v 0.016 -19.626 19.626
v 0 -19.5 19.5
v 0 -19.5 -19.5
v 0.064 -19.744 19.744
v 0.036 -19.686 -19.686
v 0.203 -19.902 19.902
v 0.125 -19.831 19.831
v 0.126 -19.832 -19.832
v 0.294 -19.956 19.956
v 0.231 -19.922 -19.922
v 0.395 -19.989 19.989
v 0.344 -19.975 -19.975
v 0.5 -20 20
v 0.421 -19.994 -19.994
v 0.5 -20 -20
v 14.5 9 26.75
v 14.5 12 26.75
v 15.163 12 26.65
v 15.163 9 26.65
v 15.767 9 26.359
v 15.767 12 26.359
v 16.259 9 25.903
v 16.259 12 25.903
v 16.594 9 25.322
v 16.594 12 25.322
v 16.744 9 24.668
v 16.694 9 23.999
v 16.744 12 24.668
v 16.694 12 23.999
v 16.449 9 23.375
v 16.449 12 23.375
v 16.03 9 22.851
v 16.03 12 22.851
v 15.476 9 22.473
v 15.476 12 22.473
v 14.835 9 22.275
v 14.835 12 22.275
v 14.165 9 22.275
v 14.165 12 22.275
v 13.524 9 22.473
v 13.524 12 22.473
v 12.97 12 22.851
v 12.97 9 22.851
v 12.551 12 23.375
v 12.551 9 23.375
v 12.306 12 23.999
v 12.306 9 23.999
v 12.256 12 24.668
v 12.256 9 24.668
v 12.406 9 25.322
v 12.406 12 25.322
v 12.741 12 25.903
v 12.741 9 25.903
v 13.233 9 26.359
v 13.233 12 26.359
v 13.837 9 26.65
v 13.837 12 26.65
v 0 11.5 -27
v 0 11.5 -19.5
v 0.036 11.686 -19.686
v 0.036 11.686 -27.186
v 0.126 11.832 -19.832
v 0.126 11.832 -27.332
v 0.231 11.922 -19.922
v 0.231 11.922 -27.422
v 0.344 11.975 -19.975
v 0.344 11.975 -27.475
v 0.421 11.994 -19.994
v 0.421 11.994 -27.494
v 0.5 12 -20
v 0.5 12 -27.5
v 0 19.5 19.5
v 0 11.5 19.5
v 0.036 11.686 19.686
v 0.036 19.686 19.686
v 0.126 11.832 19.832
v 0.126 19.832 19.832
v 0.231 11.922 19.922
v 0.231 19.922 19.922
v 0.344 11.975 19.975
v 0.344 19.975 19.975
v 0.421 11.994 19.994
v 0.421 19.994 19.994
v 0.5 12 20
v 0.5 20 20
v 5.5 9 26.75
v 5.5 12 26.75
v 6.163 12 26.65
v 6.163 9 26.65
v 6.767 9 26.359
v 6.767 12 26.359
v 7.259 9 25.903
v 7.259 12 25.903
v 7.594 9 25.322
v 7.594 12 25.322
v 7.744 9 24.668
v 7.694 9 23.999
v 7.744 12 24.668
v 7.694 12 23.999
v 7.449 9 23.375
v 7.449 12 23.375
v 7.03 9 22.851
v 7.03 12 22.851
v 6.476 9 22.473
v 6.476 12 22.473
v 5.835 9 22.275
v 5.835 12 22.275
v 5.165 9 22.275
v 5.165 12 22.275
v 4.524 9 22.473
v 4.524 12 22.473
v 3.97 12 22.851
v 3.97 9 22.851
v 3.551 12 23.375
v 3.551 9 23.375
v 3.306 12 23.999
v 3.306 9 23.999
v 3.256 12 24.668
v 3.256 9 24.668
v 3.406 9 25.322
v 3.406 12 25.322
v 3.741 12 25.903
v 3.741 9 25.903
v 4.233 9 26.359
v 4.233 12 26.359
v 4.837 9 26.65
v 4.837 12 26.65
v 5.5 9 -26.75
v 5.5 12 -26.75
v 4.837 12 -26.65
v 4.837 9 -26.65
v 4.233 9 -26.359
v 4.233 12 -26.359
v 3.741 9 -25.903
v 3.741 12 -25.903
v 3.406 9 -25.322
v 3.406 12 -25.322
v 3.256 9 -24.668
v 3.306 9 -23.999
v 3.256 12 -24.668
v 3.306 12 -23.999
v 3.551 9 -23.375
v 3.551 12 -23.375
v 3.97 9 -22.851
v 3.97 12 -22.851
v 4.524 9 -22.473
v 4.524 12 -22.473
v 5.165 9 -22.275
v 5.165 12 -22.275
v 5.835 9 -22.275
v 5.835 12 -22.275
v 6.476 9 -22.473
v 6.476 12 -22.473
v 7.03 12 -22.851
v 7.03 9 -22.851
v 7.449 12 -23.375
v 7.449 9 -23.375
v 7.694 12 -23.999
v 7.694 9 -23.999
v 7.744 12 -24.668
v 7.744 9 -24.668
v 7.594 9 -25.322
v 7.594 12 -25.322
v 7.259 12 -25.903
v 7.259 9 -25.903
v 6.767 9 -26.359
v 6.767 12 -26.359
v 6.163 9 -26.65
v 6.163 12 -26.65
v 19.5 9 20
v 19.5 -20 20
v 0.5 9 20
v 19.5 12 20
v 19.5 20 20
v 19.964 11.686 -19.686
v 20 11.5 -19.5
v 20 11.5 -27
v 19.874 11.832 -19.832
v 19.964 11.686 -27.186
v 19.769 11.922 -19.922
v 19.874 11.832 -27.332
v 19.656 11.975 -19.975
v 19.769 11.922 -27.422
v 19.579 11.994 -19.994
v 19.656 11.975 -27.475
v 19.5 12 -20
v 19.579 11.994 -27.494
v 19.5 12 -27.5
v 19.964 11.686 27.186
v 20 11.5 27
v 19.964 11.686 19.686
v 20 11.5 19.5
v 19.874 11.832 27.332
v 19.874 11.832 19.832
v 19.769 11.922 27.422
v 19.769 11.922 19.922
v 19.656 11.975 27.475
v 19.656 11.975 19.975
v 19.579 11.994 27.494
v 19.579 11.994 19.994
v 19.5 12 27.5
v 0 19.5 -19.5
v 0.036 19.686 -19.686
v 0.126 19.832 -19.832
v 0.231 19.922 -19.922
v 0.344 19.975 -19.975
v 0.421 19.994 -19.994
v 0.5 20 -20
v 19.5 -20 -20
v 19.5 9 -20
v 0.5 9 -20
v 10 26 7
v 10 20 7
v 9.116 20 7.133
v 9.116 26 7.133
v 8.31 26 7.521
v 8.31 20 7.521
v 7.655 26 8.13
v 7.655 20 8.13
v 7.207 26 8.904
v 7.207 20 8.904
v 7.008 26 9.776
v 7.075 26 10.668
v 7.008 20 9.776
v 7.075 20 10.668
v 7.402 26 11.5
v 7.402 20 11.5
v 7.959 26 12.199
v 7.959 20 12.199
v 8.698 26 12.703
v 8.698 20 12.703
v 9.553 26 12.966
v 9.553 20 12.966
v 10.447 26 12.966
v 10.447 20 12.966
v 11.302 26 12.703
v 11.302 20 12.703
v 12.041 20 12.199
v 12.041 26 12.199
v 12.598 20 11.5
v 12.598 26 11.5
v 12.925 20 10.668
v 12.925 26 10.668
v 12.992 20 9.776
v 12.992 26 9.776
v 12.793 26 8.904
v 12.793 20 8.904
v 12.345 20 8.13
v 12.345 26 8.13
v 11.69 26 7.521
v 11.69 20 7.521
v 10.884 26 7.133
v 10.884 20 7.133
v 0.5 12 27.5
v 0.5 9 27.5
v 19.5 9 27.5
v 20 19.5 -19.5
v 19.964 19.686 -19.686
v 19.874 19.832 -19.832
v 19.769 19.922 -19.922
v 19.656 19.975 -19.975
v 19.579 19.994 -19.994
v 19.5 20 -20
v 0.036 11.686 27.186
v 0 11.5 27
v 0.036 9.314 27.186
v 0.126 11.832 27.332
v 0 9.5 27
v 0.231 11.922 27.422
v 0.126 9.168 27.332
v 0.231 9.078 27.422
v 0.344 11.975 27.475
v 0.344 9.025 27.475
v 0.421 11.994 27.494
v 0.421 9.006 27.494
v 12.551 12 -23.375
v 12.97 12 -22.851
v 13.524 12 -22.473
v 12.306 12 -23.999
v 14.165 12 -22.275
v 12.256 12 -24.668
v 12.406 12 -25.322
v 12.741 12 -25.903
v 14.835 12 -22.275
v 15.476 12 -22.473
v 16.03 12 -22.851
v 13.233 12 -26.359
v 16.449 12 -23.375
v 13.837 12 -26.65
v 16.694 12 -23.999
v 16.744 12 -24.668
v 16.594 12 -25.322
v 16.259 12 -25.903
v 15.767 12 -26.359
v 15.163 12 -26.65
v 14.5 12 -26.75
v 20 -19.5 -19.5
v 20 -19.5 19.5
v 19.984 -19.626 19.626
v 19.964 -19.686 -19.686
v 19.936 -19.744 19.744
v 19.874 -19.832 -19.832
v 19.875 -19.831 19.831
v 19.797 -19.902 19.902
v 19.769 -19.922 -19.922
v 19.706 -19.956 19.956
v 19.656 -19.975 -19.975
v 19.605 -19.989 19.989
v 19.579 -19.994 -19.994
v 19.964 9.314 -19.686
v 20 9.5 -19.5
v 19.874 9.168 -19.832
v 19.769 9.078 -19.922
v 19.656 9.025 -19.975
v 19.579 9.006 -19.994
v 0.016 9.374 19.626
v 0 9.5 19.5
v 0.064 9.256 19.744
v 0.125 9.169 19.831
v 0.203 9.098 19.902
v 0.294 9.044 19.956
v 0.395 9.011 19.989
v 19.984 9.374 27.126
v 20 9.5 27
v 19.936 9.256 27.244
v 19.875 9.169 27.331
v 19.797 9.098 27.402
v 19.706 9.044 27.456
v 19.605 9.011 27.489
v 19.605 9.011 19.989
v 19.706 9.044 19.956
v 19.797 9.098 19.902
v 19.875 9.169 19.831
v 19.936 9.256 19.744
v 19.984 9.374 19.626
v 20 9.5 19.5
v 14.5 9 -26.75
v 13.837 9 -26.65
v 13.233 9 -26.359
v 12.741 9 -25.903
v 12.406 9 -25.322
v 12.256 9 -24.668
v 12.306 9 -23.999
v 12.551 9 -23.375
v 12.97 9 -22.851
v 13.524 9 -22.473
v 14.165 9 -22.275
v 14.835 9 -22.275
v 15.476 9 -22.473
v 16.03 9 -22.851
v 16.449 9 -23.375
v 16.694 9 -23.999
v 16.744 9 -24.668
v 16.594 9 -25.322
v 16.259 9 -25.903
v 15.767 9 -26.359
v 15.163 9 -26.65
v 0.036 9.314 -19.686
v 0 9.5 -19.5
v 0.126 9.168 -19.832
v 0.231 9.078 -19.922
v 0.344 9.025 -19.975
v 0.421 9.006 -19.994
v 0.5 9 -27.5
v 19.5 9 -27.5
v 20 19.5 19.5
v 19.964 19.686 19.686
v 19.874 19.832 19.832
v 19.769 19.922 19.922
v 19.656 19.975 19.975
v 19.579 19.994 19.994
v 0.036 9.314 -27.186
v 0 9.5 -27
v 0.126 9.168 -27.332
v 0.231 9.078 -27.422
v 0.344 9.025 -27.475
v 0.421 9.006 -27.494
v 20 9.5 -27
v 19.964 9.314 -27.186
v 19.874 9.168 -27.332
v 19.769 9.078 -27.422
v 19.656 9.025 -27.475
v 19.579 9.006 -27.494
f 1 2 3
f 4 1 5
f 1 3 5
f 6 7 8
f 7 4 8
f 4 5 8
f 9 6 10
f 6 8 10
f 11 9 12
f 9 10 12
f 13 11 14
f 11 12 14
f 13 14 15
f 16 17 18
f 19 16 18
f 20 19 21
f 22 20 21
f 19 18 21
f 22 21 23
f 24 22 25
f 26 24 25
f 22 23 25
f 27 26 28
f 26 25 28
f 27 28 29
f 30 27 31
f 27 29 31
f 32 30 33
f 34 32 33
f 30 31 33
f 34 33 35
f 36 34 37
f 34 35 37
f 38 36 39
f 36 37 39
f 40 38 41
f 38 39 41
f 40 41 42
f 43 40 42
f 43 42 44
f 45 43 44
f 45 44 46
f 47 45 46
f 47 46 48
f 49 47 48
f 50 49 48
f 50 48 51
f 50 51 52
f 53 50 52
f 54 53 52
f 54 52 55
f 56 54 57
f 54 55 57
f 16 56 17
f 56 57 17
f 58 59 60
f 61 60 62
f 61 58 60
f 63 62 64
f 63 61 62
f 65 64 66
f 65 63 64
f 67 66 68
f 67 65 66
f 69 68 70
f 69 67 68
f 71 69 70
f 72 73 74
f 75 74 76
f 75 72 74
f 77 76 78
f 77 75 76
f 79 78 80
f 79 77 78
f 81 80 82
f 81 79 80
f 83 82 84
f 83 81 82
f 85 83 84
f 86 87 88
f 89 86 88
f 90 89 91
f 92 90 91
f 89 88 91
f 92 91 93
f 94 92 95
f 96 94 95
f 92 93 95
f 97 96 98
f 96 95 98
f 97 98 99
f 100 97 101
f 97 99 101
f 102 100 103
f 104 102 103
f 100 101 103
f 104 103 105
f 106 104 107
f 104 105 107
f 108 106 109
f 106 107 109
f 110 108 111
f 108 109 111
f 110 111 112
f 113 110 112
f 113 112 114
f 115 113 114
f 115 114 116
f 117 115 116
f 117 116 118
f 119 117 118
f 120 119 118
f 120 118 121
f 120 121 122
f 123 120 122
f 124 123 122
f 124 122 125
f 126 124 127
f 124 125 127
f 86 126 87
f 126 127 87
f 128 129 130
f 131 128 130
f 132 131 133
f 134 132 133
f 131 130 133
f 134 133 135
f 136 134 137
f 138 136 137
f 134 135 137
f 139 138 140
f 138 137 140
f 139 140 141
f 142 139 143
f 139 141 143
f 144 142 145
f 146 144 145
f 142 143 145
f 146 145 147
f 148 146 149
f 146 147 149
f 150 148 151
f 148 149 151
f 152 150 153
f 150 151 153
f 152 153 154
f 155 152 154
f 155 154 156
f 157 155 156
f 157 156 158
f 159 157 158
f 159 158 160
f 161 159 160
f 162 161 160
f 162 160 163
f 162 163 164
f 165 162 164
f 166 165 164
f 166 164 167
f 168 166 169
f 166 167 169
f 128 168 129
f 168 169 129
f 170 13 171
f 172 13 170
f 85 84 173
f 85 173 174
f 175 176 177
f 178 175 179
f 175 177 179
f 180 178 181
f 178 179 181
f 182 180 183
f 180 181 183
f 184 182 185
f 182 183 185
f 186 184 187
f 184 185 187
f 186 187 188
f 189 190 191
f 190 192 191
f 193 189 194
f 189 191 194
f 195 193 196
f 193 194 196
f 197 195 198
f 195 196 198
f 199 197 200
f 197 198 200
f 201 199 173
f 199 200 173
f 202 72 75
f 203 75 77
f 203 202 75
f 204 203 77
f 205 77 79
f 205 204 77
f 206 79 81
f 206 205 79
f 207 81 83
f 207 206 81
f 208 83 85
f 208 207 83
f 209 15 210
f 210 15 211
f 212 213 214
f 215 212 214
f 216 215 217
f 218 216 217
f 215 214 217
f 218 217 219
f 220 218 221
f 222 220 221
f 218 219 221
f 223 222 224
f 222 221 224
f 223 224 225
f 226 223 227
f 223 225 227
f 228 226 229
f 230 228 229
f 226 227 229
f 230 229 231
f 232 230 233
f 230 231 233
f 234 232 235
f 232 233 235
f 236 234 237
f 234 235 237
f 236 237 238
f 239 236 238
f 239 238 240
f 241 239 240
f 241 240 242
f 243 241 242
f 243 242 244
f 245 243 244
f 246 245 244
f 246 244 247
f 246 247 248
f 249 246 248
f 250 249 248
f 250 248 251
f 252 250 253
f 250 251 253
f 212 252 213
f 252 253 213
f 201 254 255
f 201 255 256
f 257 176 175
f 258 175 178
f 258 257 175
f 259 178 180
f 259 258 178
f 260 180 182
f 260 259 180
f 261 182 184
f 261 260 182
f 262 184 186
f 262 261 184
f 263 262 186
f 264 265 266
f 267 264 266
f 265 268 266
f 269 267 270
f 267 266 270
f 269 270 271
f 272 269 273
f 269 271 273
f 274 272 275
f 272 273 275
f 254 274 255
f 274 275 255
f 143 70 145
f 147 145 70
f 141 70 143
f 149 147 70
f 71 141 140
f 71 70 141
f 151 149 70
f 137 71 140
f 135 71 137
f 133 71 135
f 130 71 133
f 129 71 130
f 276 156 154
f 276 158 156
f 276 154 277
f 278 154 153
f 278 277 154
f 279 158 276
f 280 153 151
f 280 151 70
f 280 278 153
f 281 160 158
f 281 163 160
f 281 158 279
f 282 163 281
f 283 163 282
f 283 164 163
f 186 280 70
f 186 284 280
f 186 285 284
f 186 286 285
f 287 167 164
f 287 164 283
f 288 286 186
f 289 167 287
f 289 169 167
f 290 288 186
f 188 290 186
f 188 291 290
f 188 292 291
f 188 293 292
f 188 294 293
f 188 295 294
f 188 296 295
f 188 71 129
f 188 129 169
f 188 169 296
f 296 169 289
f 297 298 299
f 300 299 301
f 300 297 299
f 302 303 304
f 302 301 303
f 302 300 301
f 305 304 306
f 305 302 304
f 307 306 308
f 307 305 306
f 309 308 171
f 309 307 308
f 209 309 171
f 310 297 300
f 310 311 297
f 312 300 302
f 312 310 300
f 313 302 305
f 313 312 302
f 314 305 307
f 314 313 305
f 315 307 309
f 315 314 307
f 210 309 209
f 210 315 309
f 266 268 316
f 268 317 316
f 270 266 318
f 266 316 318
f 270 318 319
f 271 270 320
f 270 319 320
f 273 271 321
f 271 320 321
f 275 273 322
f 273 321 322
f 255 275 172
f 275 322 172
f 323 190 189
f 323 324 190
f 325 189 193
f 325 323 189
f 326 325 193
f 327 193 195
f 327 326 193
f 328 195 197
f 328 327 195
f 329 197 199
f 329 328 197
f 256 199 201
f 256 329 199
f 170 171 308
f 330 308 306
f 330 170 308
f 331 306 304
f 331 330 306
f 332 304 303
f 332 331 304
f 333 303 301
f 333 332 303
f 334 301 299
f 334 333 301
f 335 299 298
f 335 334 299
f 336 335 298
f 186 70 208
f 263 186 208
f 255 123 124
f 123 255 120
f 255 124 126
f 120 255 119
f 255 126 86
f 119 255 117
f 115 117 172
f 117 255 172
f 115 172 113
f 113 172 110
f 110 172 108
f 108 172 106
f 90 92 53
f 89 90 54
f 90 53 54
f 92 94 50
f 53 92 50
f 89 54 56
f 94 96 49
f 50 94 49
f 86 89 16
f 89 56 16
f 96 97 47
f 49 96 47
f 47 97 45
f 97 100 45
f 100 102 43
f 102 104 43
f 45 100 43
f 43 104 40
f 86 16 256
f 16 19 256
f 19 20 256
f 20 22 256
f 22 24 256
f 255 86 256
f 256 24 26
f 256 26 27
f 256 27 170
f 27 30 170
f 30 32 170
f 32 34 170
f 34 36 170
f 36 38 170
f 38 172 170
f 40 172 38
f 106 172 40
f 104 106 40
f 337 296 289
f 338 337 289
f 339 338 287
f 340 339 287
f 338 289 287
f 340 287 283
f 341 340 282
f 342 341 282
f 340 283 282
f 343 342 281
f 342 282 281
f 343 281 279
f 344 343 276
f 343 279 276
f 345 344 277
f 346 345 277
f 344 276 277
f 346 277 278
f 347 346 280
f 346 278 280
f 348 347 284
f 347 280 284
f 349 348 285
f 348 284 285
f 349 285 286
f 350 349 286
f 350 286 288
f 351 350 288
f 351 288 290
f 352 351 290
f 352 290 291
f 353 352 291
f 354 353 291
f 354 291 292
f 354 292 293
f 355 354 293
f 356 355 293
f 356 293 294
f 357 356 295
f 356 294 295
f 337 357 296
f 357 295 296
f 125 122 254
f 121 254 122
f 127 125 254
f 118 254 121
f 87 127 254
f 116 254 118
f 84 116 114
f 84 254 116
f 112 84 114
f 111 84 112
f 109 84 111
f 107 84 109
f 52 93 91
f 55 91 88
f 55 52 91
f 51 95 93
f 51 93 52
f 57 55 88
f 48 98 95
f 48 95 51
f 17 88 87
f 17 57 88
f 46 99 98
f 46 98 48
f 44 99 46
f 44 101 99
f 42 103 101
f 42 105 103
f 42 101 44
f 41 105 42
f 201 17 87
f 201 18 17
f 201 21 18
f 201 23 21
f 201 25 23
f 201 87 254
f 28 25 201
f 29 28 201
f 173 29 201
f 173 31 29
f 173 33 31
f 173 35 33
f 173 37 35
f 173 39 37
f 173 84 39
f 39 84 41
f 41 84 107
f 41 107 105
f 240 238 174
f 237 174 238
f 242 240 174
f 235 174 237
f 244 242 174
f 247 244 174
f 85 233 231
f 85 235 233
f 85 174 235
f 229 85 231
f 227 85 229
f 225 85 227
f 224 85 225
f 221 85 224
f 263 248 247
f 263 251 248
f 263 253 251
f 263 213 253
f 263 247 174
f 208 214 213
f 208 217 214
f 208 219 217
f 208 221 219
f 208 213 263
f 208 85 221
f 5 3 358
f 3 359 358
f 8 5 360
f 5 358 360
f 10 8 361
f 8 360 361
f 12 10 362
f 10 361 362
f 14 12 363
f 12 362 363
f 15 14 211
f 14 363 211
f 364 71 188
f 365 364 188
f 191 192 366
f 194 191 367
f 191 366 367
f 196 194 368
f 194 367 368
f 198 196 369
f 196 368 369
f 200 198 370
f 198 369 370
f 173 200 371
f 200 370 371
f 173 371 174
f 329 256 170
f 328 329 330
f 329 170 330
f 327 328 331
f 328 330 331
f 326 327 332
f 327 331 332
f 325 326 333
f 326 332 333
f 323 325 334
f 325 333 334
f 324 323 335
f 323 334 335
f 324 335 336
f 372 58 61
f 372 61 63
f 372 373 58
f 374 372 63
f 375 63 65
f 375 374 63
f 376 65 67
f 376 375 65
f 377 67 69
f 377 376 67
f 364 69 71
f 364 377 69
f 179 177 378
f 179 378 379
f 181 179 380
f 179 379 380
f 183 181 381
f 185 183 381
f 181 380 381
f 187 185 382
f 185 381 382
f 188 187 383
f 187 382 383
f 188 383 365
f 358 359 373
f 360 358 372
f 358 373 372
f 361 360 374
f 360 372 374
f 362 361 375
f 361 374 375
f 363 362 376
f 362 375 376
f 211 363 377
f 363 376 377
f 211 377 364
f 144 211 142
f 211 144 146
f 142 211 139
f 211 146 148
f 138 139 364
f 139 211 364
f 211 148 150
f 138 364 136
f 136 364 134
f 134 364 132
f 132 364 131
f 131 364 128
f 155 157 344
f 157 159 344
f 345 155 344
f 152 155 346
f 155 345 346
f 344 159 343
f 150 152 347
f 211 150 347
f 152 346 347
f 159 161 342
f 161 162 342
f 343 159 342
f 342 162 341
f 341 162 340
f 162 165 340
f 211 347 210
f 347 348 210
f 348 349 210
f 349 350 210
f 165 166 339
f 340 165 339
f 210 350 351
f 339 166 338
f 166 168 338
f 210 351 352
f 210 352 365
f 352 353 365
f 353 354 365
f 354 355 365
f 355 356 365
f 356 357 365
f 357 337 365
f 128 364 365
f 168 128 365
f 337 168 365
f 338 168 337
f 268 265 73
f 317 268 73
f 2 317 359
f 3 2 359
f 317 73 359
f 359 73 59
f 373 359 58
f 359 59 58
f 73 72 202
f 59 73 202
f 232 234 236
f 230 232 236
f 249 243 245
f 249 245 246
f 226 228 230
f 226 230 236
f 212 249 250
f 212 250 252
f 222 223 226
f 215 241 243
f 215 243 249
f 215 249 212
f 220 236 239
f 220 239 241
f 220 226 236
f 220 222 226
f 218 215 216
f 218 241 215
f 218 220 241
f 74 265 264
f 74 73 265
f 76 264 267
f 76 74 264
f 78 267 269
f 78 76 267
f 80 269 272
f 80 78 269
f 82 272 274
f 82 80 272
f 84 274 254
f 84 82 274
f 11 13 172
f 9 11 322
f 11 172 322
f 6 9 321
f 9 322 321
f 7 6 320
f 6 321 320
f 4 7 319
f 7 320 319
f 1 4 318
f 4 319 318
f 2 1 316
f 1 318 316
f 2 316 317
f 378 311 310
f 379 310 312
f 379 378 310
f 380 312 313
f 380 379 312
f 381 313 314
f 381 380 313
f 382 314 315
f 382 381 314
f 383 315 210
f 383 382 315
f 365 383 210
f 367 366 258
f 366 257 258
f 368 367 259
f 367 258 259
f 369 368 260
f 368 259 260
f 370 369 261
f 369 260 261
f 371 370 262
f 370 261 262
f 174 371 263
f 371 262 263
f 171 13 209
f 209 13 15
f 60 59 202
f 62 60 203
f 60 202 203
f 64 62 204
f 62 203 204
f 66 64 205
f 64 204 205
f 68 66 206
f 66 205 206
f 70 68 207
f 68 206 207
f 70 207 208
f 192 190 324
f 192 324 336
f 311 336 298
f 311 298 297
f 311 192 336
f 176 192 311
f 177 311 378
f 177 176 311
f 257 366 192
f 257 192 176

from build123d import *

# Parameters (mm, degrees)
SKETCH_1_W          = 40
SKETCH_1_H          = 40
EXTRUDE_1_DEPTH     = 20
SKETCH_2_R          = 3
EXTRUDE_2_DEPTH     = 6
EXTRUDE_START       = -8
SKETCH_3_W          = 20
SKETCH_3_H          = 7.5
EXTRUDE_3_DEPTH     = 3
SKETCH_4_R          = 2.25
CUT_EXTRUDE_1_DEPTH = 3
FILLET_1_R          = 0.5


with BuildPart() as part:
    # 草图1 → 凸台-拉伸1 (new body)
    with BuildSketch(Plane(origin=(0, 0, 0), x_dir=(0, 0, -1), z_dir=(1, 0, 0))):
        Rectangle(SKETCH_1_W, SKETCH_1_H)
    extrude(amount=EXTRUDE_1_DEPTH)

    # 草图2 → 凸台-拉伸2 (add)
    with BuildSketch(Plane(origin=(0, 20, 0), x_dir=(1, 0, 0), z_dir=(0, 1, 0))):
        with Locations(Location((10, -10, 0), (0, 0, 90))):
            Circle(SKETCH_2_R)
    extrude(amount=EXTRUDE_2_DEPTH)

    # 草图3 → 凸台-拉伸3 (add)
    with BuildSketch(Plane(origin=(0, 20, 0), x_dir=(1, 0, 0), z_dir=(0, 1, 0)).offset(EXTRUDE_START)):
        with Locations((10, -23.75)):
            Rectangle(SKETCH_3_W, SKETCH_3_H)
        with Locations((10, 23.75)):
            Rectangle(SKETCH_3_W, SKETCH_3_H)
    extrude(amount=-EXTRUDE_3_DEPTH)

    # 草图4 → 切除-拉伸1 (cut)
    with BuildSketch(Plane(origin=(0, 12, 0), x_dir=(1, 0, 0), z_dir=(0, 1, 0))):
        with Locations(Location((14.5, -24.5, 0), (0, 0, 270))):
            Circle(SKETCH_4_R)
        with Locations(Location((5.5, -24.5, 0), (0, 0, 270))):
            Circle(SKETCH_4_R)
        with Locations(Location((5.5, 24.5, 0), (0, 0, 90))):
            Circle(SKETCH_4_R)
        with Locations(Location((14.5, 24.5, 0), (0, 0, 90))):
            Circle(SKETCH_4_R)
    extrude(amount=-CUT_EXTRUDE_1_DEPTH, mode=Mode.SUBTRACT)

    # 圆角1
    fillet_1_edges = [part.edges().sort_by_distance(p)[0] for p in [
        (20, -5.5, -20),
        (20, 20, 0),
        (0, 16, -20),
        (20, 16, -20),
        (0, -5.5, 20),
        (20, -5.5, 20),
        (0, 9, 23.75),
        (0, 10.5, 27.5),
        (20, 9, 23.75),
        (20, 10.5, 27.5),
        (0, 12, 23.75),
        (20, 12, 23.75),
        (0, 9, -23.75),
        (0, 10.5, -27.5),
        (20, 9, -23.75),
        (20, 10.5, -27.5),
        (0, 12, -23.75),
        (20, 12, -23.75),
        (20, 16, 20),
        (0, 20, 0),
        (0, -5.5, -20),
        (0, -20, 0),
        (0, 16, 20),
        (20, -20, 0),
    ]]
    fillet(fillet_1_edges, radius=FILLET_1_R)


solid = part.part
